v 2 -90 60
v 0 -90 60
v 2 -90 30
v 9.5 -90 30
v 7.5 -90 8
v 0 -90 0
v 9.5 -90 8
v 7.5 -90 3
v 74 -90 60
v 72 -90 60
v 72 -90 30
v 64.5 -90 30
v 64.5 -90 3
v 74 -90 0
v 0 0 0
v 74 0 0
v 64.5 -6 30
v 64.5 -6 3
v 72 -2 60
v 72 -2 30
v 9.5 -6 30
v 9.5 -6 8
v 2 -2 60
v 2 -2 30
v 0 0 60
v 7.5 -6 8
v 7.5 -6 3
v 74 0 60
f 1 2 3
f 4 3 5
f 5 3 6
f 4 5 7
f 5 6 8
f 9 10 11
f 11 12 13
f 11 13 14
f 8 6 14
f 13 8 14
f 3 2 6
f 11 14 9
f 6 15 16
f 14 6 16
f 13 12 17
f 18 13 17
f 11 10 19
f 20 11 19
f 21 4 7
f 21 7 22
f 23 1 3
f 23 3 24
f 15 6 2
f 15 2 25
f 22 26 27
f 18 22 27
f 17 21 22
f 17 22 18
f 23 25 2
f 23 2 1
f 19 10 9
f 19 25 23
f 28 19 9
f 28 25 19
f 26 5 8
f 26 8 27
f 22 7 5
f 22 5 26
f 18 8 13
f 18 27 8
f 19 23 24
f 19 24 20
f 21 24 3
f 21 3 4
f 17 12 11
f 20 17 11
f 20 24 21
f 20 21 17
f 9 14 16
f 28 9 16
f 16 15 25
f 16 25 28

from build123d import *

# Parameters (mm, degrees)
F0_W     = 74
F0_H     = 90
F1_DEPTH = 60
F2_W     = 70
F2_H     = 88
F3_DEPTH = 30
F4_W     = 55
F4_H     = 84
F5_DEPTH = 27
F6_W     = 84
F6_H     = 5
F7_DEPTH = 2


with BuildPart() as f1:
    # F0 (on Top) → F1 (new body)
    with BuildSketch(Plane.XY):
        with Locations((37, -45)):
            Rectangle(F0_W, F0_H)
    extrude(amount=F1_DEPTH)

    # F2 (on face) → F3 (cut)
    with BuildSketch(Plane.XY.offset(60)):
        with Locations((37, -46)):
            Rectangle(F2_W, F2_H)
    extrude(amount=-F3_DEPTH, mode=Mode.SUBTRACT)

    # F4 (on face) → F5 (cut)
    with BuildSketch(Plane.XY.offset(30)):
        with Locations((37, -48)):
            Rectangle(F4_W, F4_H)
    extrude(amount=-F5_DEPTH, mode=Mode.SUBTRACT)

    # F6 (on face) → F7 (cut)
    with BuildSketch(Plane.YZ.offset(9.5)):
        with Locations((-48, 5.5)):
            Rectangle(F6_W, F6_H)
    extrude(amount=-F7_DEPTH, mode=Mode.SUBTRACT)


solid = f1.part
